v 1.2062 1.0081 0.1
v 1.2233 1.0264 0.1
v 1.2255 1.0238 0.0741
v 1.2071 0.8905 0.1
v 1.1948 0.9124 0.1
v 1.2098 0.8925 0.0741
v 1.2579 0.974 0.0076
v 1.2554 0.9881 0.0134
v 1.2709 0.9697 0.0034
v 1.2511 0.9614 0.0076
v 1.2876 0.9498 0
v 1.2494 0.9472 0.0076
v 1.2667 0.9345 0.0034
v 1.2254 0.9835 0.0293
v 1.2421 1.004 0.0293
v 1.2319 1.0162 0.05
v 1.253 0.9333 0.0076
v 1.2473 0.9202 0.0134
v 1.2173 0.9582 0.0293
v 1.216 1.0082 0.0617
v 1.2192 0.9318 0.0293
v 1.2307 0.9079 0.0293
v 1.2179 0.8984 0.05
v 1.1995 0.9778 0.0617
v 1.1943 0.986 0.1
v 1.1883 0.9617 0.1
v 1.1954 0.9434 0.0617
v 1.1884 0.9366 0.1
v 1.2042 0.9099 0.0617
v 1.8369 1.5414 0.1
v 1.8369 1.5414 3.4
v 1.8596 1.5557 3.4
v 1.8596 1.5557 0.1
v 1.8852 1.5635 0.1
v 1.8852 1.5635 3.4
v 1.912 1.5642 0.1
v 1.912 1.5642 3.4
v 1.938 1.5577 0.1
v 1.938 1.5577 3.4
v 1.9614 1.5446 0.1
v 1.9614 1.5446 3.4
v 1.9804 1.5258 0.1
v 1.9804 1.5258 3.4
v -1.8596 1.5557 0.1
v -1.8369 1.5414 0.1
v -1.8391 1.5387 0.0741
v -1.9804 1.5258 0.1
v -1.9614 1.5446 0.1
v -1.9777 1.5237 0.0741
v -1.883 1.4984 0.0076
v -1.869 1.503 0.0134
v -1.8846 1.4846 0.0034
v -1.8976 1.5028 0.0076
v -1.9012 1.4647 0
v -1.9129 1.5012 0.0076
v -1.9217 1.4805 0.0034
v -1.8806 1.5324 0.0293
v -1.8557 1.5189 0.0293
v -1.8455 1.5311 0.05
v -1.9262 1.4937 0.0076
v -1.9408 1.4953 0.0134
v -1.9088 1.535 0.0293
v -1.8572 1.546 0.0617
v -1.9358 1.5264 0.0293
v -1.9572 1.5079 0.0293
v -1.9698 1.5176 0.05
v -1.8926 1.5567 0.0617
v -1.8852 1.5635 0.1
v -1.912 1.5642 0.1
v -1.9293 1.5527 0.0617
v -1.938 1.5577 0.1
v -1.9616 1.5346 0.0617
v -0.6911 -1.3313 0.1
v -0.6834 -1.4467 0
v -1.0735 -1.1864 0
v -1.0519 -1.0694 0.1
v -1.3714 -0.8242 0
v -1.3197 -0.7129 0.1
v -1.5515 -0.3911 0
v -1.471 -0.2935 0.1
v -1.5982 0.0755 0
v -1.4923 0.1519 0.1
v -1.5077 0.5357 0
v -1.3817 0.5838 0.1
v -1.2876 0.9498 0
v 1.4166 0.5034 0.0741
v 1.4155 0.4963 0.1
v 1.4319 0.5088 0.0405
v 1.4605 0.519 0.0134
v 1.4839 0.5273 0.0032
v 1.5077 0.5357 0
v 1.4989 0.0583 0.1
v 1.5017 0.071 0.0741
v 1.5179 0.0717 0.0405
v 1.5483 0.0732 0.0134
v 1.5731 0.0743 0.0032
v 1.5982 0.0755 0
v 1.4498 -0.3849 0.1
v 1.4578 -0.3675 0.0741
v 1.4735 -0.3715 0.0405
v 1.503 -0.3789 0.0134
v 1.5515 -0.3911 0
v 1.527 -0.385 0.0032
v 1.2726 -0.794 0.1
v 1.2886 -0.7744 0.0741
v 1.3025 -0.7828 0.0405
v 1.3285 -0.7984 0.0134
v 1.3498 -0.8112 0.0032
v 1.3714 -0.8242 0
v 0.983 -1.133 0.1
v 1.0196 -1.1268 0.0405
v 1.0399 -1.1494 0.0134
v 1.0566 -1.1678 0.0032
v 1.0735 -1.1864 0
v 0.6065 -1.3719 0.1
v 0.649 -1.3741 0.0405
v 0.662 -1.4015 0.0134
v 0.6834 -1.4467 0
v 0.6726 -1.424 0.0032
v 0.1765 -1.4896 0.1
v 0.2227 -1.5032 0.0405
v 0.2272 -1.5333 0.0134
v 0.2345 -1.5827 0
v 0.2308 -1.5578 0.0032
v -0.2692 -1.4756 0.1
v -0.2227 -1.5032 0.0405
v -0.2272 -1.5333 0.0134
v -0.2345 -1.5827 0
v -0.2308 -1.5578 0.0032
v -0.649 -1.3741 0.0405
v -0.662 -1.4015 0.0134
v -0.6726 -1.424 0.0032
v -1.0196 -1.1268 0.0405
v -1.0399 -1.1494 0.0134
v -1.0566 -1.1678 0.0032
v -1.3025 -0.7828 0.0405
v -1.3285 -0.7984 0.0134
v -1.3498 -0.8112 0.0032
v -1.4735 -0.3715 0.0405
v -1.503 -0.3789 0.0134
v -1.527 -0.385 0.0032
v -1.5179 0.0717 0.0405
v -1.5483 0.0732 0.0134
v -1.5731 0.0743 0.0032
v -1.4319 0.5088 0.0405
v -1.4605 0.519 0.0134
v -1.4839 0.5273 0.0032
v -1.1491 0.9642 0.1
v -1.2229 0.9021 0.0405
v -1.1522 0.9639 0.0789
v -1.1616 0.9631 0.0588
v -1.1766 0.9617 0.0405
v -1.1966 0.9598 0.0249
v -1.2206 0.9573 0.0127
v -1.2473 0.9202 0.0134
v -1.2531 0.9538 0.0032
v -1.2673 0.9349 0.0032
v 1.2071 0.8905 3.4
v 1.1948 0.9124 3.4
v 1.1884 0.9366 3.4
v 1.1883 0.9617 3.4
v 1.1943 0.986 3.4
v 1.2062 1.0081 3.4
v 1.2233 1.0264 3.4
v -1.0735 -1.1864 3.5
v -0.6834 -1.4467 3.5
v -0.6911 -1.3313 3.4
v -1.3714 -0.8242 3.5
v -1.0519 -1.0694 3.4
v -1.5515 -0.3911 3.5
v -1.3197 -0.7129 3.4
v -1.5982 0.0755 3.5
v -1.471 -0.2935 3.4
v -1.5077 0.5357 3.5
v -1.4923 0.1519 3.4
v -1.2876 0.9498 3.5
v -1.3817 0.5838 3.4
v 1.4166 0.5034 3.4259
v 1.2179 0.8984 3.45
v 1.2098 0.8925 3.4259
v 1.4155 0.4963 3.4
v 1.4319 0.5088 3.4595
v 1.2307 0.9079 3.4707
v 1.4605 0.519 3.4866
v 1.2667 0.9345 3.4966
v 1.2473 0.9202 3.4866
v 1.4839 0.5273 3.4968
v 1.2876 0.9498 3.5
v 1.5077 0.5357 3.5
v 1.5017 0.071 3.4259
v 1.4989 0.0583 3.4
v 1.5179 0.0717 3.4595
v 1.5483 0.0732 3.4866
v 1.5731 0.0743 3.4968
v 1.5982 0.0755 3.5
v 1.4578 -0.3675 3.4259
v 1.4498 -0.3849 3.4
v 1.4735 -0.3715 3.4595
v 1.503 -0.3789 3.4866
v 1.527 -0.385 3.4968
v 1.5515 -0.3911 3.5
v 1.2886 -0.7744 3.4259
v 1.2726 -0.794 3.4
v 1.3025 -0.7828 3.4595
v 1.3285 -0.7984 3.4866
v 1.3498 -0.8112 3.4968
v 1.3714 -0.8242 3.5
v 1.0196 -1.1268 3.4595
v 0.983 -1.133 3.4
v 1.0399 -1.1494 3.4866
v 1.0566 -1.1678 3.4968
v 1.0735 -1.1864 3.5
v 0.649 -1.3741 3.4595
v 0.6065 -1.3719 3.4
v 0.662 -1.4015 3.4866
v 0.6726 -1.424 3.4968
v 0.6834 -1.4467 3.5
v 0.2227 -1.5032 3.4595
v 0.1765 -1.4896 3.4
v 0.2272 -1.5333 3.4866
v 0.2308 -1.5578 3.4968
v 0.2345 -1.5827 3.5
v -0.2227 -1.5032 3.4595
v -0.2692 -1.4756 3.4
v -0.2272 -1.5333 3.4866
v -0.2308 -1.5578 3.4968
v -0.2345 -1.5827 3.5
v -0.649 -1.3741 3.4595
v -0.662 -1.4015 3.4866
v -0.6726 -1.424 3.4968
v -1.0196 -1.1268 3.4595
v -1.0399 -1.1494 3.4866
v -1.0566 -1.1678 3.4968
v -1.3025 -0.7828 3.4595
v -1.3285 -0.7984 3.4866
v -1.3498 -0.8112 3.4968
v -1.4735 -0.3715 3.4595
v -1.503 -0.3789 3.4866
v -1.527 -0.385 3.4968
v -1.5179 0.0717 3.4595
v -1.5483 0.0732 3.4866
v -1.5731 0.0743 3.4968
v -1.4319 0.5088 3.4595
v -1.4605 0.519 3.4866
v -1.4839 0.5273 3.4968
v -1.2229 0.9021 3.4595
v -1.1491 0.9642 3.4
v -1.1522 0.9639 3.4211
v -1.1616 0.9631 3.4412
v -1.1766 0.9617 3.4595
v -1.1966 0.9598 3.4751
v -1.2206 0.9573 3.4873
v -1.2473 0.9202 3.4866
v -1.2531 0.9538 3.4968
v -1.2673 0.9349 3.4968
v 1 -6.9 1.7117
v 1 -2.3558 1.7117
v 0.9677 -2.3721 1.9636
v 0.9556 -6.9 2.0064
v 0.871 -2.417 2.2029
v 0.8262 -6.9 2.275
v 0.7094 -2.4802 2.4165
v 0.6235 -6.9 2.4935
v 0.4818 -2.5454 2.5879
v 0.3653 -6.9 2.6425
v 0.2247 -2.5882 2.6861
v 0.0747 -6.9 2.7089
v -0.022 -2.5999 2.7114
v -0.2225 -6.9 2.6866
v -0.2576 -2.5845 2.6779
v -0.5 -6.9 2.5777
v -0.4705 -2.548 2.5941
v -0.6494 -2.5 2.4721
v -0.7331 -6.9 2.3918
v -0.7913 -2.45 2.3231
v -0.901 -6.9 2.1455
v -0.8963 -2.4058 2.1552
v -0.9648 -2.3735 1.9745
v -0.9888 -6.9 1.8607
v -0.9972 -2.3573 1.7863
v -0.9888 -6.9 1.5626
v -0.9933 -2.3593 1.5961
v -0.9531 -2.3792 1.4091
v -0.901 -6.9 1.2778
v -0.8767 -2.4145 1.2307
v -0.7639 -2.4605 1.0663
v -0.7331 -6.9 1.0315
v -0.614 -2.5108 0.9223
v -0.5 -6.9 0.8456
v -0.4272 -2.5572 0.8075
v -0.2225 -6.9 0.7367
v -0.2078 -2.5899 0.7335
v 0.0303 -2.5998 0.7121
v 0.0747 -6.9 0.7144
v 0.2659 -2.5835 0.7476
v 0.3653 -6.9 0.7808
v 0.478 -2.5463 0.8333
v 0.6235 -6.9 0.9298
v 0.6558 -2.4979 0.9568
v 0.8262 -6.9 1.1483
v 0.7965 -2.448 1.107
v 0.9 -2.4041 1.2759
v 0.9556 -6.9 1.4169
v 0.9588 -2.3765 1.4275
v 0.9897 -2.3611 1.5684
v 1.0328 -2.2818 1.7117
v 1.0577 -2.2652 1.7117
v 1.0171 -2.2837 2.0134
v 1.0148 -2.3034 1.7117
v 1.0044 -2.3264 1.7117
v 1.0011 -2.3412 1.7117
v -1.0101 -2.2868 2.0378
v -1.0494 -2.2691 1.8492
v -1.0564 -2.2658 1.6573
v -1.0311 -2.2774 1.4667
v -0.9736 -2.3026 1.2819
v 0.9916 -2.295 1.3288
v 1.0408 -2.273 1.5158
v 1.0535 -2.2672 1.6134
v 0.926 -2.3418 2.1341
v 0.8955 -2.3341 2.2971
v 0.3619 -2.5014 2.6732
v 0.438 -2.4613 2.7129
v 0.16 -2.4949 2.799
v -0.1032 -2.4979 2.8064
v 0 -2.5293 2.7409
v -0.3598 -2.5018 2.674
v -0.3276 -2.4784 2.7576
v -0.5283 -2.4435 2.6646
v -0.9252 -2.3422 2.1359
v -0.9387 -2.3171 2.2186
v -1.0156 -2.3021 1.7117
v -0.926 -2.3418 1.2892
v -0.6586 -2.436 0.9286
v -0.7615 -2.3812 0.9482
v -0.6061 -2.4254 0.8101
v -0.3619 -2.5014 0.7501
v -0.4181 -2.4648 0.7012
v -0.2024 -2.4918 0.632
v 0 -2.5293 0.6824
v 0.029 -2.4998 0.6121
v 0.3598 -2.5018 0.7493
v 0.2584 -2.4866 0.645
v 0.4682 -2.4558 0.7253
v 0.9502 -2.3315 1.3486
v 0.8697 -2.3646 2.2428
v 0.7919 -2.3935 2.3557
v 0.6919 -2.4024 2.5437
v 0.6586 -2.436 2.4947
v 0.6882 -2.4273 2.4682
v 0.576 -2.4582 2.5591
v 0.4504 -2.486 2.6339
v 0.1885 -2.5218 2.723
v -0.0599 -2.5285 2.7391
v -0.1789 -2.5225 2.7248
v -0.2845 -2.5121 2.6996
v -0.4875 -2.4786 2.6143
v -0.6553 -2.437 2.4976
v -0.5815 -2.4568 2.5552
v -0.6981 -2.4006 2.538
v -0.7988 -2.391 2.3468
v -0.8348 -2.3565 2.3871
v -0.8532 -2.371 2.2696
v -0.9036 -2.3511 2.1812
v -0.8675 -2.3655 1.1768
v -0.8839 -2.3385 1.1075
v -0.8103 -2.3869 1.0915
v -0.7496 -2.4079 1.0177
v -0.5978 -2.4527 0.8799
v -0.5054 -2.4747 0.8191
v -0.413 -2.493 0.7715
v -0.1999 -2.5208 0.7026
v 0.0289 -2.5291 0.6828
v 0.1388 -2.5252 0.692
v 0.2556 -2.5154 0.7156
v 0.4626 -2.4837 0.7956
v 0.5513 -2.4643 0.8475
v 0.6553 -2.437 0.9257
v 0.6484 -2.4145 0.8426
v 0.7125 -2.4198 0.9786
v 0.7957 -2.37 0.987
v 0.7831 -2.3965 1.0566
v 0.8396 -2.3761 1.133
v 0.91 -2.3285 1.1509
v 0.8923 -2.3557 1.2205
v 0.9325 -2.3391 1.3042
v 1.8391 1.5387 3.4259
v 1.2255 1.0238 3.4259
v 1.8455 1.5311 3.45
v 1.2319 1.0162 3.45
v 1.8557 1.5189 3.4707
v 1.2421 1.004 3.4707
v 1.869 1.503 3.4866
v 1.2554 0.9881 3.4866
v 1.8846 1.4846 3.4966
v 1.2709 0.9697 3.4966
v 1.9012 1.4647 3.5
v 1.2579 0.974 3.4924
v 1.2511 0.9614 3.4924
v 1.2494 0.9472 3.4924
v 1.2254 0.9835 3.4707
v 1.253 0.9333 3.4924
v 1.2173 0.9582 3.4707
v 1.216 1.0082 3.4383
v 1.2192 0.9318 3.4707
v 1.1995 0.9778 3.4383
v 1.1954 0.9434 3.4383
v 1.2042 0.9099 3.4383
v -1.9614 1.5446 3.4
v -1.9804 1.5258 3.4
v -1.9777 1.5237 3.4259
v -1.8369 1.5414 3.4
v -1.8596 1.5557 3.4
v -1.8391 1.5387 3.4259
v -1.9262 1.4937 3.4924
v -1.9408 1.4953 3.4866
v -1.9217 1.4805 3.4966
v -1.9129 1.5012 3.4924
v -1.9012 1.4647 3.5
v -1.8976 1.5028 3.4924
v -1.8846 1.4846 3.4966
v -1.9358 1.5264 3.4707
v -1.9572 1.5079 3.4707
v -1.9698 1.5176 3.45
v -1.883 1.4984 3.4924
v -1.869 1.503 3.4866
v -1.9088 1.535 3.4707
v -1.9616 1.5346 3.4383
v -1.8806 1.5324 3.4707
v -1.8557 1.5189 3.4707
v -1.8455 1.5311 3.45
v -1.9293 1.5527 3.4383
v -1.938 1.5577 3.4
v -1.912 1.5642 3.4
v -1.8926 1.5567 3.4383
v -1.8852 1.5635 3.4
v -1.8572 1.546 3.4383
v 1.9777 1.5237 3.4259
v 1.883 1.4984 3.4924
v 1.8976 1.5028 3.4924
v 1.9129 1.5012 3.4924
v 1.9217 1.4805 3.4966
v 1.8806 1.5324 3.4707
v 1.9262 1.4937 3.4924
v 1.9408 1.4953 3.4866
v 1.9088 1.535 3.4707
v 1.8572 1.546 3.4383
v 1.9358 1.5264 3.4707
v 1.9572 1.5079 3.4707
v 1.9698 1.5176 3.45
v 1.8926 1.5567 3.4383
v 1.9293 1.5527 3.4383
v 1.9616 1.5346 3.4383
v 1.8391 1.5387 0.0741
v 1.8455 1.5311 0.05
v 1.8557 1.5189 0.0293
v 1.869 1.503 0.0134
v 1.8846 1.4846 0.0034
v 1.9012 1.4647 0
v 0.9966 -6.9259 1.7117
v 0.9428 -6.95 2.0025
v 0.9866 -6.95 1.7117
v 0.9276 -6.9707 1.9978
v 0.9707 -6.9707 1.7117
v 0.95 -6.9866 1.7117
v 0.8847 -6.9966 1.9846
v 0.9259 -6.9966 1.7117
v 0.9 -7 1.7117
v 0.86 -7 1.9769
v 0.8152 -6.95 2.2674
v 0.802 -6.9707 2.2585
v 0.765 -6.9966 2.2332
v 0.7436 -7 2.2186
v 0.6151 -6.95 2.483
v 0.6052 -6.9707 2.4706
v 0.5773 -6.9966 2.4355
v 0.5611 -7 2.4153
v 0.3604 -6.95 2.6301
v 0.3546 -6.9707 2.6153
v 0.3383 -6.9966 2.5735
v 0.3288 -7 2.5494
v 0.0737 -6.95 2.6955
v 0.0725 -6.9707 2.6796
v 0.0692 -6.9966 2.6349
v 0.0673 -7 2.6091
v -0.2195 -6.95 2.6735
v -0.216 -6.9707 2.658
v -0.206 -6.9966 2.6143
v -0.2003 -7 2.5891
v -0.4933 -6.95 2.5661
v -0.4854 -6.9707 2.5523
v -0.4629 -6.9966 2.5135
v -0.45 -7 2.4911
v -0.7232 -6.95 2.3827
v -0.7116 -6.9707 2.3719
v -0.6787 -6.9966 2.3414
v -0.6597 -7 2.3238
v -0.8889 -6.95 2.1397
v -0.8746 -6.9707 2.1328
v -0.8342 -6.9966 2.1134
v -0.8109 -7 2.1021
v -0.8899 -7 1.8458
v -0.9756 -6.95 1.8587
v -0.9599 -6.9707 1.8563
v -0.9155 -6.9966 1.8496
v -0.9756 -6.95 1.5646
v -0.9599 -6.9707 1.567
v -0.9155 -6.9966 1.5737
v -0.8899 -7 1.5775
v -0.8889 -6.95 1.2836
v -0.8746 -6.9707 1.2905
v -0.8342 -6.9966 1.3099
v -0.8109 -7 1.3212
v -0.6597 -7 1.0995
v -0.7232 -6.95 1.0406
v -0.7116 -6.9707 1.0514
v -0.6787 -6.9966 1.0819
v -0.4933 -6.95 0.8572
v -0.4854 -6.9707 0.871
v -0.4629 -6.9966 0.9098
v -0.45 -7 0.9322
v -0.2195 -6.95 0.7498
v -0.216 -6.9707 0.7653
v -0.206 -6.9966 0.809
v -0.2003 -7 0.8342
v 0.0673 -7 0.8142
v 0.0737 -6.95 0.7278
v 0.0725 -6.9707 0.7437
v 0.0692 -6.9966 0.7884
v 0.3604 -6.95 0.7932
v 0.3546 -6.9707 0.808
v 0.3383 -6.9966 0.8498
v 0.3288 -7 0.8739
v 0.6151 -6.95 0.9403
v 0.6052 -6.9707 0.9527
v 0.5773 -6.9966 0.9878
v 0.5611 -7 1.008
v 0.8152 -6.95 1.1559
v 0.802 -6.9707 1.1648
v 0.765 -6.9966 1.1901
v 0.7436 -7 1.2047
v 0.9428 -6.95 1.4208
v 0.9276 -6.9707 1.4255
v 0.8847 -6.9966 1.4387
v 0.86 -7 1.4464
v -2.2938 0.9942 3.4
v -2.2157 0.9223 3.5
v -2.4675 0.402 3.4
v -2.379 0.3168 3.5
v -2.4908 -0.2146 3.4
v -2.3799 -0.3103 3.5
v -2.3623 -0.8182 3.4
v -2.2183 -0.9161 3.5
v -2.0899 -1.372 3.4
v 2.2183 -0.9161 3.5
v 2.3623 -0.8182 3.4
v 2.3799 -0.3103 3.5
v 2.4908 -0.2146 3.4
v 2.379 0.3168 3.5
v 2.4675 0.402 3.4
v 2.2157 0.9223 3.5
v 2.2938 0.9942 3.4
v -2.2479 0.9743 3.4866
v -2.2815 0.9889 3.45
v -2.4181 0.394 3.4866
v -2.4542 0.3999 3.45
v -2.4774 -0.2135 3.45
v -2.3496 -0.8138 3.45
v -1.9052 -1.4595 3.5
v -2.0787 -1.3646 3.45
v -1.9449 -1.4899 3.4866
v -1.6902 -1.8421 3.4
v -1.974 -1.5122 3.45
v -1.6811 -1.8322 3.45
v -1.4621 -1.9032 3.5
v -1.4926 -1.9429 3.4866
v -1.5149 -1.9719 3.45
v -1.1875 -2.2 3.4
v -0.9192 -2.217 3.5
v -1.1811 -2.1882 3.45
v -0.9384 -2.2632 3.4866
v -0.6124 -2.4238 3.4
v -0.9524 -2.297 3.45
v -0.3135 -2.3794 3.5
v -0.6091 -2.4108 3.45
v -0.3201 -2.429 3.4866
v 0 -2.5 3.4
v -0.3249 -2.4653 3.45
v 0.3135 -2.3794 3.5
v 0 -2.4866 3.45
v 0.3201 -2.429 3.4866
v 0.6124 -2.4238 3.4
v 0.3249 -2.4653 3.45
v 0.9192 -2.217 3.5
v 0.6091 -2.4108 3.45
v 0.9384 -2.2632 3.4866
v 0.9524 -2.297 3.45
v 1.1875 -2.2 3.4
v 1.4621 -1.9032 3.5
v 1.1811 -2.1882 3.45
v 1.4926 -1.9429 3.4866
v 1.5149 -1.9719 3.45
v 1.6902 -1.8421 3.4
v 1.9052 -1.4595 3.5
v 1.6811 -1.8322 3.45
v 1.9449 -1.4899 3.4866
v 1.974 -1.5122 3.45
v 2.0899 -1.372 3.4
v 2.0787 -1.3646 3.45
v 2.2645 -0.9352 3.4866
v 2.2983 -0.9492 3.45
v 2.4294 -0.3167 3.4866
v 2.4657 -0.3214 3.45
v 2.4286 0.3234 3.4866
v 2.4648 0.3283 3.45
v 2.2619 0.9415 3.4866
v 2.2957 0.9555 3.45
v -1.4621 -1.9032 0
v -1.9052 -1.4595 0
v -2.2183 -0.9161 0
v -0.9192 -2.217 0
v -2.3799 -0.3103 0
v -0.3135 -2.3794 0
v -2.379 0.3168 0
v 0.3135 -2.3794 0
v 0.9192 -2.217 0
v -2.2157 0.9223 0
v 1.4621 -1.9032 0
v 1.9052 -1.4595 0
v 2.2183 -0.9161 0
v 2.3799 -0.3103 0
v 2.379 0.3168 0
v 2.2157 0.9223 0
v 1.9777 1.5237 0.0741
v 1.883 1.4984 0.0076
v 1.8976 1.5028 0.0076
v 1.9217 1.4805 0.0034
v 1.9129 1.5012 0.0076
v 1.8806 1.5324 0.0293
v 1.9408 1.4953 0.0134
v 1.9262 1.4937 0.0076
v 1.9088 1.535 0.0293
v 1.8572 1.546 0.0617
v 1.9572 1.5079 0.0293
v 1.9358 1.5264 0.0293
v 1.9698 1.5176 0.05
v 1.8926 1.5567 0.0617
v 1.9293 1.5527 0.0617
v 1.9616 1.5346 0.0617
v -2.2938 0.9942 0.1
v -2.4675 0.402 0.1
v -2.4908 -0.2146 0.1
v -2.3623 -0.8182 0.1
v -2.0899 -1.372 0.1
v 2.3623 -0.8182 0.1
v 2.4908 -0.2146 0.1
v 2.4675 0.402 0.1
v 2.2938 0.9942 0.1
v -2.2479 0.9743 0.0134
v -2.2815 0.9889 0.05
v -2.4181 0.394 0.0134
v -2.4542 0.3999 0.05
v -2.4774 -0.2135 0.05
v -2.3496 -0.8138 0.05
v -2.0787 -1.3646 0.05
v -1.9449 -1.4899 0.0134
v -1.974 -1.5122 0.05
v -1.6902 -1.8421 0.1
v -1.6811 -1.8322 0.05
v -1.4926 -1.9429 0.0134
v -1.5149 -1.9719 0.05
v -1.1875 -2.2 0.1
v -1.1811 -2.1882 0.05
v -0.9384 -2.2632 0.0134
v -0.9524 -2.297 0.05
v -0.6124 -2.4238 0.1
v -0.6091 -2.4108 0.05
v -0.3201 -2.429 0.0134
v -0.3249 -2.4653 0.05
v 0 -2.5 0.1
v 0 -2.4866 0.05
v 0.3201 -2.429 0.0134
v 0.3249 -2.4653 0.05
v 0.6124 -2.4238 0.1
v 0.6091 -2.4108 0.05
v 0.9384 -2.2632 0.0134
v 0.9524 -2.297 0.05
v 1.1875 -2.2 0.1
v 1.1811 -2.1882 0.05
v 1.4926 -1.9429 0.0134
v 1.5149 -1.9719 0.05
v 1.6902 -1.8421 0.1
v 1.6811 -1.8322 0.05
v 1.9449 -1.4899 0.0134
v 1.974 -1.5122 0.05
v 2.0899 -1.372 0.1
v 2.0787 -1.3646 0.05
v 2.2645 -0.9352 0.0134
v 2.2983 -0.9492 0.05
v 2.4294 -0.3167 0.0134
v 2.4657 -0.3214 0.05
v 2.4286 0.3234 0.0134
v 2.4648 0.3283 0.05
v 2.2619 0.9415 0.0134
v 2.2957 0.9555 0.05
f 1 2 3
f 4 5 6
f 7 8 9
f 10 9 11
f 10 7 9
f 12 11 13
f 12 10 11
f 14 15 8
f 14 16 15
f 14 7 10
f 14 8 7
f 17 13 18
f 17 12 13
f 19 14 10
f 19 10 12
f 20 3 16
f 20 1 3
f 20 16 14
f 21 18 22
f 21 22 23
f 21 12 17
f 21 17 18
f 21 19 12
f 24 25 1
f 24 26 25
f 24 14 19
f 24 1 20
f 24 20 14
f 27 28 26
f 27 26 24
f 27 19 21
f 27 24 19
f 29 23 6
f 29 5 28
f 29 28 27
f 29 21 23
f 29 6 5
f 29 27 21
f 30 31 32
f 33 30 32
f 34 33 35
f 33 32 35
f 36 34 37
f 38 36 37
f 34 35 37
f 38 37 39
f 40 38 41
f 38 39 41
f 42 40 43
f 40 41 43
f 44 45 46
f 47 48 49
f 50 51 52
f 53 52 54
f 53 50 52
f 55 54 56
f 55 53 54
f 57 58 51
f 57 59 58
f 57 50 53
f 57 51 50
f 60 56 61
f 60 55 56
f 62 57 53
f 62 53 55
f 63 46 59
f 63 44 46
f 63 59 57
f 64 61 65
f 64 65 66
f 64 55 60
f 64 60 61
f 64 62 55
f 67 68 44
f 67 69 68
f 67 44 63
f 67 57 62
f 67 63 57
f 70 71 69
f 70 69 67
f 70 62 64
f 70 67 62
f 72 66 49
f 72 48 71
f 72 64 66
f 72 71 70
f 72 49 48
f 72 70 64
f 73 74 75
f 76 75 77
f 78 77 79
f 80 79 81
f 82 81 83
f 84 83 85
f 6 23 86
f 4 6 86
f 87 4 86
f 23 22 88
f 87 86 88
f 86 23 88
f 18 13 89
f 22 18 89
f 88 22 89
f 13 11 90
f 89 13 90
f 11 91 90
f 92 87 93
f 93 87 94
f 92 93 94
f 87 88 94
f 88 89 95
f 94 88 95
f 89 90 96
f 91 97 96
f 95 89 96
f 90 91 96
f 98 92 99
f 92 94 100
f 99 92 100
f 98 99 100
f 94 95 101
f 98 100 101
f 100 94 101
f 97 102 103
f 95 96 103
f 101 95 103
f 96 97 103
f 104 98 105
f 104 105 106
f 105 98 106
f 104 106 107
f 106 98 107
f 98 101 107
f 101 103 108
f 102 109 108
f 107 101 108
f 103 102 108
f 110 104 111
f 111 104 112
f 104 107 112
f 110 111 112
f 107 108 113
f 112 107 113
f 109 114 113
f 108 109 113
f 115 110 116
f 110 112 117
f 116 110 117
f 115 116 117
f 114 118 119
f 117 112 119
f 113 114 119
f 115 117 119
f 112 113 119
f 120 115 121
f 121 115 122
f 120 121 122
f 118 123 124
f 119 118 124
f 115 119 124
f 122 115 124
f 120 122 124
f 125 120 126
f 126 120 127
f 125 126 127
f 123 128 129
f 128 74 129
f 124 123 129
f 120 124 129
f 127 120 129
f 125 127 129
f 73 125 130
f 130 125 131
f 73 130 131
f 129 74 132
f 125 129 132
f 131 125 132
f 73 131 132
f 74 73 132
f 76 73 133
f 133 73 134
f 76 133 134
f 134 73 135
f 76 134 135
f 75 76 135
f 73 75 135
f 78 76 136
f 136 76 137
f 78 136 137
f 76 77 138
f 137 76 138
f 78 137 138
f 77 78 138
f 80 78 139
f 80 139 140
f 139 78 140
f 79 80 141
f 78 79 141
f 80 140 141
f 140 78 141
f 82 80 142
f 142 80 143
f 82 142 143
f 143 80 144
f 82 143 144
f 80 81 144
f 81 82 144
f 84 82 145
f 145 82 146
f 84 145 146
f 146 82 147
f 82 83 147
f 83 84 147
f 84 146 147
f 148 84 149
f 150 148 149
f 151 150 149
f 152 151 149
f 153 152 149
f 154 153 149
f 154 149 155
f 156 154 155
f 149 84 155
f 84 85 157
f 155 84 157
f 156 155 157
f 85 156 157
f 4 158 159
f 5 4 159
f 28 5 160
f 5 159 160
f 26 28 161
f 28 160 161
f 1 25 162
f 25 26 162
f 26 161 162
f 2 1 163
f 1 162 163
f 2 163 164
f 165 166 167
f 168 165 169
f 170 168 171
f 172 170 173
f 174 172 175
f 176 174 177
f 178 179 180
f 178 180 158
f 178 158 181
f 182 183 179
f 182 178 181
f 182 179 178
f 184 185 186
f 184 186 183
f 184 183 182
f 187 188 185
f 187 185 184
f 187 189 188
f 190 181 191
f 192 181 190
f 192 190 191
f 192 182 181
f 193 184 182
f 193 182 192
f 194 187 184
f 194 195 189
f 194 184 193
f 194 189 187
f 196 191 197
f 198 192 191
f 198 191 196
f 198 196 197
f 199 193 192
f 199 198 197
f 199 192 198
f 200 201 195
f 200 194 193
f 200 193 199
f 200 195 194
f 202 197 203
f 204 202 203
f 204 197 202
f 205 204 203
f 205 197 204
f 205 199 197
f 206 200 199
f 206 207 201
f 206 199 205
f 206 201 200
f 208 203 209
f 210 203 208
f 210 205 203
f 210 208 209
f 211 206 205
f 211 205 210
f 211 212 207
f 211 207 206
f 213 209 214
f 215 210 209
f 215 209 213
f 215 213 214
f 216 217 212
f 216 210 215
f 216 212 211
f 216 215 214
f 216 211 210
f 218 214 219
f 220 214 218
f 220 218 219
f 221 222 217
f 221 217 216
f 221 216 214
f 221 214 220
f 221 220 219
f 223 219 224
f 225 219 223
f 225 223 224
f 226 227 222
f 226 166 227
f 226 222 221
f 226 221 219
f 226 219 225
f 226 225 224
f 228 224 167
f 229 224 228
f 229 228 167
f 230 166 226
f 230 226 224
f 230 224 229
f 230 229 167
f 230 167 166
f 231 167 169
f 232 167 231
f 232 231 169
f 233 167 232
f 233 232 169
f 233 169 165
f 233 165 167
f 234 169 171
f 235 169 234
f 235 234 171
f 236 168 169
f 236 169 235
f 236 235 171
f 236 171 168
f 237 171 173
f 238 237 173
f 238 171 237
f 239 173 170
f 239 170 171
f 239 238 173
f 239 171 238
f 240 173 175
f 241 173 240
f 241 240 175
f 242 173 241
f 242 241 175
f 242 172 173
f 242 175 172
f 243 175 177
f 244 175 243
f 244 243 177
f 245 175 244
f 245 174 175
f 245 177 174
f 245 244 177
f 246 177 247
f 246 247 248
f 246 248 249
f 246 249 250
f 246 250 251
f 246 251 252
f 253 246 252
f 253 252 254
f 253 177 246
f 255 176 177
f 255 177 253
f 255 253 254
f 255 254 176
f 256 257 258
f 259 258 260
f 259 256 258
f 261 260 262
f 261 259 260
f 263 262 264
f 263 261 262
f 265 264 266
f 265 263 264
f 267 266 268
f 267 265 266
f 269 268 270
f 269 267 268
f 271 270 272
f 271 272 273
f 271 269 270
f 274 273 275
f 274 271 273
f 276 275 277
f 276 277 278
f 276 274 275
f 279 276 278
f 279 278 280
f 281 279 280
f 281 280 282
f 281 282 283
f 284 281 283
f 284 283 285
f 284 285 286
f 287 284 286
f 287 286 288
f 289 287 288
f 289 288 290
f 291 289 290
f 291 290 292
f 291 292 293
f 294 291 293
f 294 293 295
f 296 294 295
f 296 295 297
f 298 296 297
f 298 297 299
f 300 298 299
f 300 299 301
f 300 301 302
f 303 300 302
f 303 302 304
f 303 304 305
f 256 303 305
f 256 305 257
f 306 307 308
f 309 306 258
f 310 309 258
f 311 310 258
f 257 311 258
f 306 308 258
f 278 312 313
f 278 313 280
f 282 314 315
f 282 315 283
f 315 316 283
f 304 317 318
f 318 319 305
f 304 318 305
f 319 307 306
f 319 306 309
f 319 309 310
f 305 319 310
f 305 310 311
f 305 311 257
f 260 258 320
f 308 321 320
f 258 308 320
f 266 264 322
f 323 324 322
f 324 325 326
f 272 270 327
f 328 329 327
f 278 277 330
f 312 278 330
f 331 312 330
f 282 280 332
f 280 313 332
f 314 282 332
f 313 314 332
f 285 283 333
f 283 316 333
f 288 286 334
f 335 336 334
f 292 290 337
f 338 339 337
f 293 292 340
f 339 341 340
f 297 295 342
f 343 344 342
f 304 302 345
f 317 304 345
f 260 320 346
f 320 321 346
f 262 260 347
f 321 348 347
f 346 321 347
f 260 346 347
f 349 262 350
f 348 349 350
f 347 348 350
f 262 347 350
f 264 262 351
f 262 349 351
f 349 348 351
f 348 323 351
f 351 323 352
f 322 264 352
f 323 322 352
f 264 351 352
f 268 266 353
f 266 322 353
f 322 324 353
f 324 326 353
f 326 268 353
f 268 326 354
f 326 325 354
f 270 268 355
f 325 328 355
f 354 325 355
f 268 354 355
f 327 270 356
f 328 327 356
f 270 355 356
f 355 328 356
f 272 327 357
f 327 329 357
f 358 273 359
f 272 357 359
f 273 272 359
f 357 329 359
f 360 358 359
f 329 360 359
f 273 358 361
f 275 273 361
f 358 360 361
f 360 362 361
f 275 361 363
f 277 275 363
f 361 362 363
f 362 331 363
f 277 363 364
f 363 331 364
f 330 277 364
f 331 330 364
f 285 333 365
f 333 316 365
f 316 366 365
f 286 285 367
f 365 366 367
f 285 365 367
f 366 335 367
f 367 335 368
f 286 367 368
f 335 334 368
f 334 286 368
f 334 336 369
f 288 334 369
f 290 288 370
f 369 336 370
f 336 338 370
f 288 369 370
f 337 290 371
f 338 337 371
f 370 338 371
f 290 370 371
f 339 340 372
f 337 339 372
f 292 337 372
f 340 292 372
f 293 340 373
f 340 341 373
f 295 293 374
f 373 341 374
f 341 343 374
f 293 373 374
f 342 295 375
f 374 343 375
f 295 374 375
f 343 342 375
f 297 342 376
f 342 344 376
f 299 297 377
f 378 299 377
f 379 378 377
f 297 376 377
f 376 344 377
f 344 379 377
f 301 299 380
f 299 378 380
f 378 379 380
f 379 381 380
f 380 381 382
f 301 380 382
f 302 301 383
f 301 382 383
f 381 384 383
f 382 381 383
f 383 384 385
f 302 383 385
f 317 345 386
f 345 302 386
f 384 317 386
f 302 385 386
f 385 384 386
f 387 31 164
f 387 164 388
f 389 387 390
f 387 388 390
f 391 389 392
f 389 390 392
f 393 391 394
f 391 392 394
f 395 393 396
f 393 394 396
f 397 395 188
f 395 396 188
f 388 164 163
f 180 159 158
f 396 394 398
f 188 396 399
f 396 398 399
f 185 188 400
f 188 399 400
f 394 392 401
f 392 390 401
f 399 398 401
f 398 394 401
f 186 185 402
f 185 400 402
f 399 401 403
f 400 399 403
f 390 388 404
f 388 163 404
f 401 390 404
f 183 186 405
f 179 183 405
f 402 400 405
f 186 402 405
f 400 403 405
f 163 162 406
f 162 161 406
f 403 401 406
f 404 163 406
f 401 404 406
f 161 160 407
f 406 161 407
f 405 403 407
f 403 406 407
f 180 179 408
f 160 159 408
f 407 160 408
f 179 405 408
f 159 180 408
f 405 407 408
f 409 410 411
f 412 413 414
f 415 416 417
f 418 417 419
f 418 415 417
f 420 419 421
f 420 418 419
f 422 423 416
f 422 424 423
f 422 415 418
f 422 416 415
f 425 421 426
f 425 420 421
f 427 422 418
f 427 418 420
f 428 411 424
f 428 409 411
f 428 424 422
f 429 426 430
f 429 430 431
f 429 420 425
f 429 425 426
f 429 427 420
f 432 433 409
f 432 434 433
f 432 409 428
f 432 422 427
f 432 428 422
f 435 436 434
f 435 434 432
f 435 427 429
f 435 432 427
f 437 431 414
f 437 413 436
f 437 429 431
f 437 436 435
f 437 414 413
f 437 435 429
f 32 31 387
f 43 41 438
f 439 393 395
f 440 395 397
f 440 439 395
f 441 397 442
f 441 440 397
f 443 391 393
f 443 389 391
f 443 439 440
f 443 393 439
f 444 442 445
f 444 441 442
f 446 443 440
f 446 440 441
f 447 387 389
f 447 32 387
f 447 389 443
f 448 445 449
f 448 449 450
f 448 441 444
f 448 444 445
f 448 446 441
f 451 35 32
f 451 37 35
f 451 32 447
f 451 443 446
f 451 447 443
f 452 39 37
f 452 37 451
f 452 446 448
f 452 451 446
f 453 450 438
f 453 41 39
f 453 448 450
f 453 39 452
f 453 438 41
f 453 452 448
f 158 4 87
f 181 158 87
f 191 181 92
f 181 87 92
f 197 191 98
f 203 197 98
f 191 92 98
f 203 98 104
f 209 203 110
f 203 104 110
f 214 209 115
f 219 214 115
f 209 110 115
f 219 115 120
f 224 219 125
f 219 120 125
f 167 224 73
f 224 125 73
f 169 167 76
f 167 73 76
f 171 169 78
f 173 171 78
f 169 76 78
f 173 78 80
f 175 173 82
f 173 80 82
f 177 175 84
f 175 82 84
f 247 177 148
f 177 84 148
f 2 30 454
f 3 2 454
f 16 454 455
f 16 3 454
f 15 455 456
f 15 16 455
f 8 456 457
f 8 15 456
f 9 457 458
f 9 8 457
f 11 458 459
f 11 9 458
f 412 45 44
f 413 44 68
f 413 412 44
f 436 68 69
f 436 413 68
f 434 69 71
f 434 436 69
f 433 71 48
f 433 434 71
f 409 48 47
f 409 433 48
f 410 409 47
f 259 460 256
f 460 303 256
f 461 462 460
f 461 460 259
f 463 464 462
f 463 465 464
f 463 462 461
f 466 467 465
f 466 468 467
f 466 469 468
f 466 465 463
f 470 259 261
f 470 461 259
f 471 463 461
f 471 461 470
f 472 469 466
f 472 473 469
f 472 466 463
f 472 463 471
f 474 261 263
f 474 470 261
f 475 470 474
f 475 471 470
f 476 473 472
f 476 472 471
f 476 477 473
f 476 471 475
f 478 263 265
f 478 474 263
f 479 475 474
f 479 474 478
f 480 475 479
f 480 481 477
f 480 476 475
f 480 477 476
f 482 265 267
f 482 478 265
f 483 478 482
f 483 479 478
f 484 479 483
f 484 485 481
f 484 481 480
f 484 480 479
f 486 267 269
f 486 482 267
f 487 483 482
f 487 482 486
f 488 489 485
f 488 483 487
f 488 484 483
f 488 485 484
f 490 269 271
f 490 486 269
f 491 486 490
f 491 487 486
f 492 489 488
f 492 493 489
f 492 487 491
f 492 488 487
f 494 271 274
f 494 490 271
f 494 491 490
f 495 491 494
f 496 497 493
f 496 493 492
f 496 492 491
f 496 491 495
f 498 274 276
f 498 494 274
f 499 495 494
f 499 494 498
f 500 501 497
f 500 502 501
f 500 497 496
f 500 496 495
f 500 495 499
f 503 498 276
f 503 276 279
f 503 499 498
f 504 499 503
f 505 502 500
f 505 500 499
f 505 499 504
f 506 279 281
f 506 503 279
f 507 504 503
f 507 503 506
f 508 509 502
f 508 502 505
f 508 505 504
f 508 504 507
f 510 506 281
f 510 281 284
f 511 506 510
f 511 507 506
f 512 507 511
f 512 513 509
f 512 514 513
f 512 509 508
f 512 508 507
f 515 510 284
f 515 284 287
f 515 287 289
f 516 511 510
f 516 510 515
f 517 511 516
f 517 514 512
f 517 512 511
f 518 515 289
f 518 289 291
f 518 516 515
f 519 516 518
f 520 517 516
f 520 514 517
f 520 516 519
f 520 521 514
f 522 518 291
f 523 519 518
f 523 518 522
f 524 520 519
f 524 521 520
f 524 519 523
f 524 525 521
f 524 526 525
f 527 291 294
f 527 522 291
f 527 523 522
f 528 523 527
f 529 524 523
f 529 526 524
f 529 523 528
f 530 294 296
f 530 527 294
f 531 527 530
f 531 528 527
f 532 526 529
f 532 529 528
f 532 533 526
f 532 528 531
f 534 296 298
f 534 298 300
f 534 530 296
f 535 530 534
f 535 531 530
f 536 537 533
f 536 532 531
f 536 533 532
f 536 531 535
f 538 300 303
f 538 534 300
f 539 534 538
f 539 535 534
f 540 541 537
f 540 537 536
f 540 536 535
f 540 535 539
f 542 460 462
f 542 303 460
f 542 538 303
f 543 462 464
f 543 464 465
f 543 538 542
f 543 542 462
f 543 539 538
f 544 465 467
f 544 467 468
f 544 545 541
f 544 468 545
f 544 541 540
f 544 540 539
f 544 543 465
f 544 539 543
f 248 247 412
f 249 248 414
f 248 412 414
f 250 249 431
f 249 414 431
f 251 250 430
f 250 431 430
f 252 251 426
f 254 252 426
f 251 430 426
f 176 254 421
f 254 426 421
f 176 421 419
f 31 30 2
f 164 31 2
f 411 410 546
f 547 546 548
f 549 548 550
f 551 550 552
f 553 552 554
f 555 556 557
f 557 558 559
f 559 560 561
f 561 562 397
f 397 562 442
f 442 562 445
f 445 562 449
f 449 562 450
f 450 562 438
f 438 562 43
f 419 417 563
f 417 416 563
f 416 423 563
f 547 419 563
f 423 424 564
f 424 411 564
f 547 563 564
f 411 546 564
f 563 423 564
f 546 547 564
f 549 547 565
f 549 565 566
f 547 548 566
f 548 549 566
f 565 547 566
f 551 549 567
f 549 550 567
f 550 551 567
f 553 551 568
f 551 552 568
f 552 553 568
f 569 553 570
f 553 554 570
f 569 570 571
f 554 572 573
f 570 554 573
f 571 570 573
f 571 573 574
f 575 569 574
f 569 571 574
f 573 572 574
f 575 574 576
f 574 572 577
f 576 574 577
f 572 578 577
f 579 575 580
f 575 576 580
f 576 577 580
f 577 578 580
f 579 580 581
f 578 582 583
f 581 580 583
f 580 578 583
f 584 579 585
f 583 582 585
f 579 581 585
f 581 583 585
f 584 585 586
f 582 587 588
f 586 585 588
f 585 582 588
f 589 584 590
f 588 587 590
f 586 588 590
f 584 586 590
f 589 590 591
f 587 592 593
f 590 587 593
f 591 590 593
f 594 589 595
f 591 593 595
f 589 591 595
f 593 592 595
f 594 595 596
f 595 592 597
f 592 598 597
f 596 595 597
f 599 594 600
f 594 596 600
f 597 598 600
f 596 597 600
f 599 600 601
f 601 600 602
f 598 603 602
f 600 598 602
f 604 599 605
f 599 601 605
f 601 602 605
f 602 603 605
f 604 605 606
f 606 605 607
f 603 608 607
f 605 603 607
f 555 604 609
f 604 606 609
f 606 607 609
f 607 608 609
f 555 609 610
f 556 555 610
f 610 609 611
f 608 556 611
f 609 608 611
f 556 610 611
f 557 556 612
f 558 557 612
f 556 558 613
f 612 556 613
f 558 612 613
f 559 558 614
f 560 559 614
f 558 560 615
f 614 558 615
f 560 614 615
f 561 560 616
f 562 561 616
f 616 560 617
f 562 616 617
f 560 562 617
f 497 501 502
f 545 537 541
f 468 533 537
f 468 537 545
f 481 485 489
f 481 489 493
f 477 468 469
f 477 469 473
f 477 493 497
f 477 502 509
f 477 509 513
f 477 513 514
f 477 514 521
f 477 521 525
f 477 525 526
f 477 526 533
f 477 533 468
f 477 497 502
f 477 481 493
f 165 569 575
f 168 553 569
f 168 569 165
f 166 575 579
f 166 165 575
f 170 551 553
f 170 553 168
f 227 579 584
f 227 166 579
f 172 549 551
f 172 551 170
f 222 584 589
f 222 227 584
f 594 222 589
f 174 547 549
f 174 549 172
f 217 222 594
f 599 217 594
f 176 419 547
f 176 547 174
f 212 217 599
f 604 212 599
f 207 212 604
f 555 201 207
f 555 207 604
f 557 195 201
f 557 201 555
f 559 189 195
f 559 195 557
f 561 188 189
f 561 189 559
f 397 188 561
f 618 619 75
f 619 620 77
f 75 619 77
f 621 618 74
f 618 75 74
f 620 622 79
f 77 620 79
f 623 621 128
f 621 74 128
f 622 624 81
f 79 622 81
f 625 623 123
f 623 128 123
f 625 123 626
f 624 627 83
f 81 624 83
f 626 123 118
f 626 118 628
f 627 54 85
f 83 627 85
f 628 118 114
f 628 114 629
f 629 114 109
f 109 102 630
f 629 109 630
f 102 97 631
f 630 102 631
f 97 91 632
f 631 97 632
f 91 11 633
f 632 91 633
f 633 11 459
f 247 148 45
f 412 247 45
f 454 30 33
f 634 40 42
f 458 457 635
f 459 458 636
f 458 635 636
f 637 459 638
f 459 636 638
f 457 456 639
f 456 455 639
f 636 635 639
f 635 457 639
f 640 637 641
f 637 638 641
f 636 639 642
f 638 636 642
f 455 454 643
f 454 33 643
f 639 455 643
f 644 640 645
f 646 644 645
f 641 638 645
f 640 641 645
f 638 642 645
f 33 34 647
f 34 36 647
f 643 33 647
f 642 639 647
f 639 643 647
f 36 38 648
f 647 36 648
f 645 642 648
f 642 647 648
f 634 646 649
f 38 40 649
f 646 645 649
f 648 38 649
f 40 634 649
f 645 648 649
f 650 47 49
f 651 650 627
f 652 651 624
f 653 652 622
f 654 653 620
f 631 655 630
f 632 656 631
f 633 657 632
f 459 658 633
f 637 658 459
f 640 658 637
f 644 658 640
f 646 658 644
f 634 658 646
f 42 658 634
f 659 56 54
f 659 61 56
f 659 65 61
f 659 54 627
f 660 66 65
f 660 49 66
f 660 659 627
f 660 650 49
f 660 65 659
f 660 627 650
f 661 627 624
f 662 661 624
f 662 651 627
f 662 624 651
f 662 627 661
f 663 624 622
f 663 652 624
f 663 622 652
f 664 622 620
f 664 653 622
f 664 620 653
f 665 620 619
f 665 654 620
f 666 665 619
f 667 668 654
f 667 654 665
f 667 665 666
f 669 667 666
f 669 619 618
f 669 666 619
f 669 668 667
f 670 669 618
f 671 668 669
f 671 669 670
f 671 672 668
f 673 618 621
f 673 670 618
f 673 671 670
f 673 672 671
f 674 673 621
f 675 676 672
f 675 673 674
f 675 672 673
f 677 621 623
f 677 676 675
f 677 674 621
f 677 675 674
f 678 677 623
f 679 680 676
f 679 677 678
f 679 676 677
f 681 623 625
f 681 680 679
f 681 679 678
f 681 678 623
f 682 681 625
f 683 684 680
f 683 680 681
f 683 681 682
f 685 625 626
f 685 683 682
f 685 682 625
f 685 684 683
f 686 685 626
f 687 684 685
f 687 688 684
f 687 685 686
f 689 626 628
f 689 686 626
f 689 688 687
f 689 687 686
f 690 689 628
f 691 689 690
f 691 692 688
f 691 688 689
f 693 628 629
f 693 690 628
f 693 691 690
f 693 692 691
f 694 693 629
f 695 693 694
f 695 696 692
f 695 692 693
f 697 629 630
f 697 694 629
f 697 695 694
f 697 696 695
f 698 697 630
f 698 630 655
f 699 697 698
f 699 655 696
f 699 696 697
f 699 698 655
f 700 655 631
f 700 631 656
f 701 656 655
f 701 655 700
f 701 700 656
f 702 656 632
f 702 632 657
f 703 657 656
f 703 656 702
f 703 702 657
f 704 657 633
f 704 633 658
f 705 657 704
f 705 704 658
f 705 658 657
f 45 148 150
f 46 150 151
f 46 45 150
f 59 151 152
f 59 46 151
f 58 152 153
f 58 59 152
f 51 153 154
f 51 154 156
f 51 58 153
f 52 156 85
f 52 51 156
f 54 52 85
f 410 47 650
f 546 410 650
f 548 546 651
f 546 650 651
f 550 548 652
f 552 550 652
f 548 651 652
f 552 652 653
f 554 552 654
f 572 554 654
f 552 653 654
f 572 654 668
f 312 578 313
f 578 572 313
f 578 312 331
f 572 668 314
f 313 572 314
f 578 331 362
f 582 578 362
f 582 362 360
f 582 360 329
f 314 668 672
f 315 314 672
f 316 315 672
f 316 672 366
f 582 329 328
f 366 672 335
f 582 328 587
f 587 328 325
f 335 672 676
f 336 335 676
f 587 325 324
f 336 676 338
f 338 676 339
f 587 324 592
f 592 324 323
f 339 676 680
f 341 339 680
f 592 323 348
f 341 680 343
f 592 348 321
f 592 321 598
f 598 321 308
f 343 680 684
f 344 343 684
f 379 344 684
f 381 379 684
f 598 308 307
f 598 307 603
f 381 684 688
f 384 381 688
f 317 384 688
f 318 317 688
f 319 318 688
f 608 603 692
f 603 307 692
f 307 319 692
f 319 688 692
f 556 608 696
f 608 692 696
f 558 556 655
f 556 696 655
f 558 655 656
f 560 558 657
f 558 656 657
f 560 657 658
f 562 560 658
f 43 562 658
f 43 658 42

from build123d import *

# Parameters (mm, degrees)
F1_DEPTH = 3.5
F3_R     = 1
F5_R     = 0.1


with BuildPart() as f1:
    # F0 (on Top) → F1 (new body)
    with BuildSketch(Plane.XY):
        with BuildLine():
            ThreePointArc((1.1490666647, 0.9641814145), (0, -1.5), (-1.1490666647, 0.9641814145))
            Line((-1.1490666647, 0.9641814145), (-1.9151111078, 1.6069690242))
            ThreePointArc((-1.9151111078, 1.6069690242), (0, -2.5), (1.9151111078, 1.6069690242))
            Line((1.9151111078, 1.6069690242), (1.1490666647, 0.9641814145))
        make_face()
    extrude(amount=F1_DEPTH)

    # F3 (on offset) → F4 (join, up to the next surface of F1)
    with BuildSketch(Plane.XZ.offset(7)):
        with Locations((0, 1.7116522619)):
            Circle(F3_R)
    extrude(until=Until.NEXT, dir=(0, 1, 0))

    # F5
    f5_edges = [f1.edges().sort_by_distance(p)[0] for p in [
        (-1, -7, 1.711652),
        (1, -4.645644, 1.711652),
        (-1, -2.291288, 1.711652),
        (1.915111, 1.606969, 1.75),
        (1.149067, 0.964181, 1.75),
        (1.532089, 1.285575, 0),
        (1.532089, 1.285575, 3.5),
        (0, -1.5, 0),
        (-1.532089, 1.285575, 0),
        (0, -2.5, 0),
        (-1.915111, 1.606969, 1.75),
        (0, -2.5, 3.5),
        (0, -1.5, 3.5),
        (-1.532089, 1.285575, 3.5),
    ]]
    fillet(f5_edges, radius=F5_R)


solid = f1.part
